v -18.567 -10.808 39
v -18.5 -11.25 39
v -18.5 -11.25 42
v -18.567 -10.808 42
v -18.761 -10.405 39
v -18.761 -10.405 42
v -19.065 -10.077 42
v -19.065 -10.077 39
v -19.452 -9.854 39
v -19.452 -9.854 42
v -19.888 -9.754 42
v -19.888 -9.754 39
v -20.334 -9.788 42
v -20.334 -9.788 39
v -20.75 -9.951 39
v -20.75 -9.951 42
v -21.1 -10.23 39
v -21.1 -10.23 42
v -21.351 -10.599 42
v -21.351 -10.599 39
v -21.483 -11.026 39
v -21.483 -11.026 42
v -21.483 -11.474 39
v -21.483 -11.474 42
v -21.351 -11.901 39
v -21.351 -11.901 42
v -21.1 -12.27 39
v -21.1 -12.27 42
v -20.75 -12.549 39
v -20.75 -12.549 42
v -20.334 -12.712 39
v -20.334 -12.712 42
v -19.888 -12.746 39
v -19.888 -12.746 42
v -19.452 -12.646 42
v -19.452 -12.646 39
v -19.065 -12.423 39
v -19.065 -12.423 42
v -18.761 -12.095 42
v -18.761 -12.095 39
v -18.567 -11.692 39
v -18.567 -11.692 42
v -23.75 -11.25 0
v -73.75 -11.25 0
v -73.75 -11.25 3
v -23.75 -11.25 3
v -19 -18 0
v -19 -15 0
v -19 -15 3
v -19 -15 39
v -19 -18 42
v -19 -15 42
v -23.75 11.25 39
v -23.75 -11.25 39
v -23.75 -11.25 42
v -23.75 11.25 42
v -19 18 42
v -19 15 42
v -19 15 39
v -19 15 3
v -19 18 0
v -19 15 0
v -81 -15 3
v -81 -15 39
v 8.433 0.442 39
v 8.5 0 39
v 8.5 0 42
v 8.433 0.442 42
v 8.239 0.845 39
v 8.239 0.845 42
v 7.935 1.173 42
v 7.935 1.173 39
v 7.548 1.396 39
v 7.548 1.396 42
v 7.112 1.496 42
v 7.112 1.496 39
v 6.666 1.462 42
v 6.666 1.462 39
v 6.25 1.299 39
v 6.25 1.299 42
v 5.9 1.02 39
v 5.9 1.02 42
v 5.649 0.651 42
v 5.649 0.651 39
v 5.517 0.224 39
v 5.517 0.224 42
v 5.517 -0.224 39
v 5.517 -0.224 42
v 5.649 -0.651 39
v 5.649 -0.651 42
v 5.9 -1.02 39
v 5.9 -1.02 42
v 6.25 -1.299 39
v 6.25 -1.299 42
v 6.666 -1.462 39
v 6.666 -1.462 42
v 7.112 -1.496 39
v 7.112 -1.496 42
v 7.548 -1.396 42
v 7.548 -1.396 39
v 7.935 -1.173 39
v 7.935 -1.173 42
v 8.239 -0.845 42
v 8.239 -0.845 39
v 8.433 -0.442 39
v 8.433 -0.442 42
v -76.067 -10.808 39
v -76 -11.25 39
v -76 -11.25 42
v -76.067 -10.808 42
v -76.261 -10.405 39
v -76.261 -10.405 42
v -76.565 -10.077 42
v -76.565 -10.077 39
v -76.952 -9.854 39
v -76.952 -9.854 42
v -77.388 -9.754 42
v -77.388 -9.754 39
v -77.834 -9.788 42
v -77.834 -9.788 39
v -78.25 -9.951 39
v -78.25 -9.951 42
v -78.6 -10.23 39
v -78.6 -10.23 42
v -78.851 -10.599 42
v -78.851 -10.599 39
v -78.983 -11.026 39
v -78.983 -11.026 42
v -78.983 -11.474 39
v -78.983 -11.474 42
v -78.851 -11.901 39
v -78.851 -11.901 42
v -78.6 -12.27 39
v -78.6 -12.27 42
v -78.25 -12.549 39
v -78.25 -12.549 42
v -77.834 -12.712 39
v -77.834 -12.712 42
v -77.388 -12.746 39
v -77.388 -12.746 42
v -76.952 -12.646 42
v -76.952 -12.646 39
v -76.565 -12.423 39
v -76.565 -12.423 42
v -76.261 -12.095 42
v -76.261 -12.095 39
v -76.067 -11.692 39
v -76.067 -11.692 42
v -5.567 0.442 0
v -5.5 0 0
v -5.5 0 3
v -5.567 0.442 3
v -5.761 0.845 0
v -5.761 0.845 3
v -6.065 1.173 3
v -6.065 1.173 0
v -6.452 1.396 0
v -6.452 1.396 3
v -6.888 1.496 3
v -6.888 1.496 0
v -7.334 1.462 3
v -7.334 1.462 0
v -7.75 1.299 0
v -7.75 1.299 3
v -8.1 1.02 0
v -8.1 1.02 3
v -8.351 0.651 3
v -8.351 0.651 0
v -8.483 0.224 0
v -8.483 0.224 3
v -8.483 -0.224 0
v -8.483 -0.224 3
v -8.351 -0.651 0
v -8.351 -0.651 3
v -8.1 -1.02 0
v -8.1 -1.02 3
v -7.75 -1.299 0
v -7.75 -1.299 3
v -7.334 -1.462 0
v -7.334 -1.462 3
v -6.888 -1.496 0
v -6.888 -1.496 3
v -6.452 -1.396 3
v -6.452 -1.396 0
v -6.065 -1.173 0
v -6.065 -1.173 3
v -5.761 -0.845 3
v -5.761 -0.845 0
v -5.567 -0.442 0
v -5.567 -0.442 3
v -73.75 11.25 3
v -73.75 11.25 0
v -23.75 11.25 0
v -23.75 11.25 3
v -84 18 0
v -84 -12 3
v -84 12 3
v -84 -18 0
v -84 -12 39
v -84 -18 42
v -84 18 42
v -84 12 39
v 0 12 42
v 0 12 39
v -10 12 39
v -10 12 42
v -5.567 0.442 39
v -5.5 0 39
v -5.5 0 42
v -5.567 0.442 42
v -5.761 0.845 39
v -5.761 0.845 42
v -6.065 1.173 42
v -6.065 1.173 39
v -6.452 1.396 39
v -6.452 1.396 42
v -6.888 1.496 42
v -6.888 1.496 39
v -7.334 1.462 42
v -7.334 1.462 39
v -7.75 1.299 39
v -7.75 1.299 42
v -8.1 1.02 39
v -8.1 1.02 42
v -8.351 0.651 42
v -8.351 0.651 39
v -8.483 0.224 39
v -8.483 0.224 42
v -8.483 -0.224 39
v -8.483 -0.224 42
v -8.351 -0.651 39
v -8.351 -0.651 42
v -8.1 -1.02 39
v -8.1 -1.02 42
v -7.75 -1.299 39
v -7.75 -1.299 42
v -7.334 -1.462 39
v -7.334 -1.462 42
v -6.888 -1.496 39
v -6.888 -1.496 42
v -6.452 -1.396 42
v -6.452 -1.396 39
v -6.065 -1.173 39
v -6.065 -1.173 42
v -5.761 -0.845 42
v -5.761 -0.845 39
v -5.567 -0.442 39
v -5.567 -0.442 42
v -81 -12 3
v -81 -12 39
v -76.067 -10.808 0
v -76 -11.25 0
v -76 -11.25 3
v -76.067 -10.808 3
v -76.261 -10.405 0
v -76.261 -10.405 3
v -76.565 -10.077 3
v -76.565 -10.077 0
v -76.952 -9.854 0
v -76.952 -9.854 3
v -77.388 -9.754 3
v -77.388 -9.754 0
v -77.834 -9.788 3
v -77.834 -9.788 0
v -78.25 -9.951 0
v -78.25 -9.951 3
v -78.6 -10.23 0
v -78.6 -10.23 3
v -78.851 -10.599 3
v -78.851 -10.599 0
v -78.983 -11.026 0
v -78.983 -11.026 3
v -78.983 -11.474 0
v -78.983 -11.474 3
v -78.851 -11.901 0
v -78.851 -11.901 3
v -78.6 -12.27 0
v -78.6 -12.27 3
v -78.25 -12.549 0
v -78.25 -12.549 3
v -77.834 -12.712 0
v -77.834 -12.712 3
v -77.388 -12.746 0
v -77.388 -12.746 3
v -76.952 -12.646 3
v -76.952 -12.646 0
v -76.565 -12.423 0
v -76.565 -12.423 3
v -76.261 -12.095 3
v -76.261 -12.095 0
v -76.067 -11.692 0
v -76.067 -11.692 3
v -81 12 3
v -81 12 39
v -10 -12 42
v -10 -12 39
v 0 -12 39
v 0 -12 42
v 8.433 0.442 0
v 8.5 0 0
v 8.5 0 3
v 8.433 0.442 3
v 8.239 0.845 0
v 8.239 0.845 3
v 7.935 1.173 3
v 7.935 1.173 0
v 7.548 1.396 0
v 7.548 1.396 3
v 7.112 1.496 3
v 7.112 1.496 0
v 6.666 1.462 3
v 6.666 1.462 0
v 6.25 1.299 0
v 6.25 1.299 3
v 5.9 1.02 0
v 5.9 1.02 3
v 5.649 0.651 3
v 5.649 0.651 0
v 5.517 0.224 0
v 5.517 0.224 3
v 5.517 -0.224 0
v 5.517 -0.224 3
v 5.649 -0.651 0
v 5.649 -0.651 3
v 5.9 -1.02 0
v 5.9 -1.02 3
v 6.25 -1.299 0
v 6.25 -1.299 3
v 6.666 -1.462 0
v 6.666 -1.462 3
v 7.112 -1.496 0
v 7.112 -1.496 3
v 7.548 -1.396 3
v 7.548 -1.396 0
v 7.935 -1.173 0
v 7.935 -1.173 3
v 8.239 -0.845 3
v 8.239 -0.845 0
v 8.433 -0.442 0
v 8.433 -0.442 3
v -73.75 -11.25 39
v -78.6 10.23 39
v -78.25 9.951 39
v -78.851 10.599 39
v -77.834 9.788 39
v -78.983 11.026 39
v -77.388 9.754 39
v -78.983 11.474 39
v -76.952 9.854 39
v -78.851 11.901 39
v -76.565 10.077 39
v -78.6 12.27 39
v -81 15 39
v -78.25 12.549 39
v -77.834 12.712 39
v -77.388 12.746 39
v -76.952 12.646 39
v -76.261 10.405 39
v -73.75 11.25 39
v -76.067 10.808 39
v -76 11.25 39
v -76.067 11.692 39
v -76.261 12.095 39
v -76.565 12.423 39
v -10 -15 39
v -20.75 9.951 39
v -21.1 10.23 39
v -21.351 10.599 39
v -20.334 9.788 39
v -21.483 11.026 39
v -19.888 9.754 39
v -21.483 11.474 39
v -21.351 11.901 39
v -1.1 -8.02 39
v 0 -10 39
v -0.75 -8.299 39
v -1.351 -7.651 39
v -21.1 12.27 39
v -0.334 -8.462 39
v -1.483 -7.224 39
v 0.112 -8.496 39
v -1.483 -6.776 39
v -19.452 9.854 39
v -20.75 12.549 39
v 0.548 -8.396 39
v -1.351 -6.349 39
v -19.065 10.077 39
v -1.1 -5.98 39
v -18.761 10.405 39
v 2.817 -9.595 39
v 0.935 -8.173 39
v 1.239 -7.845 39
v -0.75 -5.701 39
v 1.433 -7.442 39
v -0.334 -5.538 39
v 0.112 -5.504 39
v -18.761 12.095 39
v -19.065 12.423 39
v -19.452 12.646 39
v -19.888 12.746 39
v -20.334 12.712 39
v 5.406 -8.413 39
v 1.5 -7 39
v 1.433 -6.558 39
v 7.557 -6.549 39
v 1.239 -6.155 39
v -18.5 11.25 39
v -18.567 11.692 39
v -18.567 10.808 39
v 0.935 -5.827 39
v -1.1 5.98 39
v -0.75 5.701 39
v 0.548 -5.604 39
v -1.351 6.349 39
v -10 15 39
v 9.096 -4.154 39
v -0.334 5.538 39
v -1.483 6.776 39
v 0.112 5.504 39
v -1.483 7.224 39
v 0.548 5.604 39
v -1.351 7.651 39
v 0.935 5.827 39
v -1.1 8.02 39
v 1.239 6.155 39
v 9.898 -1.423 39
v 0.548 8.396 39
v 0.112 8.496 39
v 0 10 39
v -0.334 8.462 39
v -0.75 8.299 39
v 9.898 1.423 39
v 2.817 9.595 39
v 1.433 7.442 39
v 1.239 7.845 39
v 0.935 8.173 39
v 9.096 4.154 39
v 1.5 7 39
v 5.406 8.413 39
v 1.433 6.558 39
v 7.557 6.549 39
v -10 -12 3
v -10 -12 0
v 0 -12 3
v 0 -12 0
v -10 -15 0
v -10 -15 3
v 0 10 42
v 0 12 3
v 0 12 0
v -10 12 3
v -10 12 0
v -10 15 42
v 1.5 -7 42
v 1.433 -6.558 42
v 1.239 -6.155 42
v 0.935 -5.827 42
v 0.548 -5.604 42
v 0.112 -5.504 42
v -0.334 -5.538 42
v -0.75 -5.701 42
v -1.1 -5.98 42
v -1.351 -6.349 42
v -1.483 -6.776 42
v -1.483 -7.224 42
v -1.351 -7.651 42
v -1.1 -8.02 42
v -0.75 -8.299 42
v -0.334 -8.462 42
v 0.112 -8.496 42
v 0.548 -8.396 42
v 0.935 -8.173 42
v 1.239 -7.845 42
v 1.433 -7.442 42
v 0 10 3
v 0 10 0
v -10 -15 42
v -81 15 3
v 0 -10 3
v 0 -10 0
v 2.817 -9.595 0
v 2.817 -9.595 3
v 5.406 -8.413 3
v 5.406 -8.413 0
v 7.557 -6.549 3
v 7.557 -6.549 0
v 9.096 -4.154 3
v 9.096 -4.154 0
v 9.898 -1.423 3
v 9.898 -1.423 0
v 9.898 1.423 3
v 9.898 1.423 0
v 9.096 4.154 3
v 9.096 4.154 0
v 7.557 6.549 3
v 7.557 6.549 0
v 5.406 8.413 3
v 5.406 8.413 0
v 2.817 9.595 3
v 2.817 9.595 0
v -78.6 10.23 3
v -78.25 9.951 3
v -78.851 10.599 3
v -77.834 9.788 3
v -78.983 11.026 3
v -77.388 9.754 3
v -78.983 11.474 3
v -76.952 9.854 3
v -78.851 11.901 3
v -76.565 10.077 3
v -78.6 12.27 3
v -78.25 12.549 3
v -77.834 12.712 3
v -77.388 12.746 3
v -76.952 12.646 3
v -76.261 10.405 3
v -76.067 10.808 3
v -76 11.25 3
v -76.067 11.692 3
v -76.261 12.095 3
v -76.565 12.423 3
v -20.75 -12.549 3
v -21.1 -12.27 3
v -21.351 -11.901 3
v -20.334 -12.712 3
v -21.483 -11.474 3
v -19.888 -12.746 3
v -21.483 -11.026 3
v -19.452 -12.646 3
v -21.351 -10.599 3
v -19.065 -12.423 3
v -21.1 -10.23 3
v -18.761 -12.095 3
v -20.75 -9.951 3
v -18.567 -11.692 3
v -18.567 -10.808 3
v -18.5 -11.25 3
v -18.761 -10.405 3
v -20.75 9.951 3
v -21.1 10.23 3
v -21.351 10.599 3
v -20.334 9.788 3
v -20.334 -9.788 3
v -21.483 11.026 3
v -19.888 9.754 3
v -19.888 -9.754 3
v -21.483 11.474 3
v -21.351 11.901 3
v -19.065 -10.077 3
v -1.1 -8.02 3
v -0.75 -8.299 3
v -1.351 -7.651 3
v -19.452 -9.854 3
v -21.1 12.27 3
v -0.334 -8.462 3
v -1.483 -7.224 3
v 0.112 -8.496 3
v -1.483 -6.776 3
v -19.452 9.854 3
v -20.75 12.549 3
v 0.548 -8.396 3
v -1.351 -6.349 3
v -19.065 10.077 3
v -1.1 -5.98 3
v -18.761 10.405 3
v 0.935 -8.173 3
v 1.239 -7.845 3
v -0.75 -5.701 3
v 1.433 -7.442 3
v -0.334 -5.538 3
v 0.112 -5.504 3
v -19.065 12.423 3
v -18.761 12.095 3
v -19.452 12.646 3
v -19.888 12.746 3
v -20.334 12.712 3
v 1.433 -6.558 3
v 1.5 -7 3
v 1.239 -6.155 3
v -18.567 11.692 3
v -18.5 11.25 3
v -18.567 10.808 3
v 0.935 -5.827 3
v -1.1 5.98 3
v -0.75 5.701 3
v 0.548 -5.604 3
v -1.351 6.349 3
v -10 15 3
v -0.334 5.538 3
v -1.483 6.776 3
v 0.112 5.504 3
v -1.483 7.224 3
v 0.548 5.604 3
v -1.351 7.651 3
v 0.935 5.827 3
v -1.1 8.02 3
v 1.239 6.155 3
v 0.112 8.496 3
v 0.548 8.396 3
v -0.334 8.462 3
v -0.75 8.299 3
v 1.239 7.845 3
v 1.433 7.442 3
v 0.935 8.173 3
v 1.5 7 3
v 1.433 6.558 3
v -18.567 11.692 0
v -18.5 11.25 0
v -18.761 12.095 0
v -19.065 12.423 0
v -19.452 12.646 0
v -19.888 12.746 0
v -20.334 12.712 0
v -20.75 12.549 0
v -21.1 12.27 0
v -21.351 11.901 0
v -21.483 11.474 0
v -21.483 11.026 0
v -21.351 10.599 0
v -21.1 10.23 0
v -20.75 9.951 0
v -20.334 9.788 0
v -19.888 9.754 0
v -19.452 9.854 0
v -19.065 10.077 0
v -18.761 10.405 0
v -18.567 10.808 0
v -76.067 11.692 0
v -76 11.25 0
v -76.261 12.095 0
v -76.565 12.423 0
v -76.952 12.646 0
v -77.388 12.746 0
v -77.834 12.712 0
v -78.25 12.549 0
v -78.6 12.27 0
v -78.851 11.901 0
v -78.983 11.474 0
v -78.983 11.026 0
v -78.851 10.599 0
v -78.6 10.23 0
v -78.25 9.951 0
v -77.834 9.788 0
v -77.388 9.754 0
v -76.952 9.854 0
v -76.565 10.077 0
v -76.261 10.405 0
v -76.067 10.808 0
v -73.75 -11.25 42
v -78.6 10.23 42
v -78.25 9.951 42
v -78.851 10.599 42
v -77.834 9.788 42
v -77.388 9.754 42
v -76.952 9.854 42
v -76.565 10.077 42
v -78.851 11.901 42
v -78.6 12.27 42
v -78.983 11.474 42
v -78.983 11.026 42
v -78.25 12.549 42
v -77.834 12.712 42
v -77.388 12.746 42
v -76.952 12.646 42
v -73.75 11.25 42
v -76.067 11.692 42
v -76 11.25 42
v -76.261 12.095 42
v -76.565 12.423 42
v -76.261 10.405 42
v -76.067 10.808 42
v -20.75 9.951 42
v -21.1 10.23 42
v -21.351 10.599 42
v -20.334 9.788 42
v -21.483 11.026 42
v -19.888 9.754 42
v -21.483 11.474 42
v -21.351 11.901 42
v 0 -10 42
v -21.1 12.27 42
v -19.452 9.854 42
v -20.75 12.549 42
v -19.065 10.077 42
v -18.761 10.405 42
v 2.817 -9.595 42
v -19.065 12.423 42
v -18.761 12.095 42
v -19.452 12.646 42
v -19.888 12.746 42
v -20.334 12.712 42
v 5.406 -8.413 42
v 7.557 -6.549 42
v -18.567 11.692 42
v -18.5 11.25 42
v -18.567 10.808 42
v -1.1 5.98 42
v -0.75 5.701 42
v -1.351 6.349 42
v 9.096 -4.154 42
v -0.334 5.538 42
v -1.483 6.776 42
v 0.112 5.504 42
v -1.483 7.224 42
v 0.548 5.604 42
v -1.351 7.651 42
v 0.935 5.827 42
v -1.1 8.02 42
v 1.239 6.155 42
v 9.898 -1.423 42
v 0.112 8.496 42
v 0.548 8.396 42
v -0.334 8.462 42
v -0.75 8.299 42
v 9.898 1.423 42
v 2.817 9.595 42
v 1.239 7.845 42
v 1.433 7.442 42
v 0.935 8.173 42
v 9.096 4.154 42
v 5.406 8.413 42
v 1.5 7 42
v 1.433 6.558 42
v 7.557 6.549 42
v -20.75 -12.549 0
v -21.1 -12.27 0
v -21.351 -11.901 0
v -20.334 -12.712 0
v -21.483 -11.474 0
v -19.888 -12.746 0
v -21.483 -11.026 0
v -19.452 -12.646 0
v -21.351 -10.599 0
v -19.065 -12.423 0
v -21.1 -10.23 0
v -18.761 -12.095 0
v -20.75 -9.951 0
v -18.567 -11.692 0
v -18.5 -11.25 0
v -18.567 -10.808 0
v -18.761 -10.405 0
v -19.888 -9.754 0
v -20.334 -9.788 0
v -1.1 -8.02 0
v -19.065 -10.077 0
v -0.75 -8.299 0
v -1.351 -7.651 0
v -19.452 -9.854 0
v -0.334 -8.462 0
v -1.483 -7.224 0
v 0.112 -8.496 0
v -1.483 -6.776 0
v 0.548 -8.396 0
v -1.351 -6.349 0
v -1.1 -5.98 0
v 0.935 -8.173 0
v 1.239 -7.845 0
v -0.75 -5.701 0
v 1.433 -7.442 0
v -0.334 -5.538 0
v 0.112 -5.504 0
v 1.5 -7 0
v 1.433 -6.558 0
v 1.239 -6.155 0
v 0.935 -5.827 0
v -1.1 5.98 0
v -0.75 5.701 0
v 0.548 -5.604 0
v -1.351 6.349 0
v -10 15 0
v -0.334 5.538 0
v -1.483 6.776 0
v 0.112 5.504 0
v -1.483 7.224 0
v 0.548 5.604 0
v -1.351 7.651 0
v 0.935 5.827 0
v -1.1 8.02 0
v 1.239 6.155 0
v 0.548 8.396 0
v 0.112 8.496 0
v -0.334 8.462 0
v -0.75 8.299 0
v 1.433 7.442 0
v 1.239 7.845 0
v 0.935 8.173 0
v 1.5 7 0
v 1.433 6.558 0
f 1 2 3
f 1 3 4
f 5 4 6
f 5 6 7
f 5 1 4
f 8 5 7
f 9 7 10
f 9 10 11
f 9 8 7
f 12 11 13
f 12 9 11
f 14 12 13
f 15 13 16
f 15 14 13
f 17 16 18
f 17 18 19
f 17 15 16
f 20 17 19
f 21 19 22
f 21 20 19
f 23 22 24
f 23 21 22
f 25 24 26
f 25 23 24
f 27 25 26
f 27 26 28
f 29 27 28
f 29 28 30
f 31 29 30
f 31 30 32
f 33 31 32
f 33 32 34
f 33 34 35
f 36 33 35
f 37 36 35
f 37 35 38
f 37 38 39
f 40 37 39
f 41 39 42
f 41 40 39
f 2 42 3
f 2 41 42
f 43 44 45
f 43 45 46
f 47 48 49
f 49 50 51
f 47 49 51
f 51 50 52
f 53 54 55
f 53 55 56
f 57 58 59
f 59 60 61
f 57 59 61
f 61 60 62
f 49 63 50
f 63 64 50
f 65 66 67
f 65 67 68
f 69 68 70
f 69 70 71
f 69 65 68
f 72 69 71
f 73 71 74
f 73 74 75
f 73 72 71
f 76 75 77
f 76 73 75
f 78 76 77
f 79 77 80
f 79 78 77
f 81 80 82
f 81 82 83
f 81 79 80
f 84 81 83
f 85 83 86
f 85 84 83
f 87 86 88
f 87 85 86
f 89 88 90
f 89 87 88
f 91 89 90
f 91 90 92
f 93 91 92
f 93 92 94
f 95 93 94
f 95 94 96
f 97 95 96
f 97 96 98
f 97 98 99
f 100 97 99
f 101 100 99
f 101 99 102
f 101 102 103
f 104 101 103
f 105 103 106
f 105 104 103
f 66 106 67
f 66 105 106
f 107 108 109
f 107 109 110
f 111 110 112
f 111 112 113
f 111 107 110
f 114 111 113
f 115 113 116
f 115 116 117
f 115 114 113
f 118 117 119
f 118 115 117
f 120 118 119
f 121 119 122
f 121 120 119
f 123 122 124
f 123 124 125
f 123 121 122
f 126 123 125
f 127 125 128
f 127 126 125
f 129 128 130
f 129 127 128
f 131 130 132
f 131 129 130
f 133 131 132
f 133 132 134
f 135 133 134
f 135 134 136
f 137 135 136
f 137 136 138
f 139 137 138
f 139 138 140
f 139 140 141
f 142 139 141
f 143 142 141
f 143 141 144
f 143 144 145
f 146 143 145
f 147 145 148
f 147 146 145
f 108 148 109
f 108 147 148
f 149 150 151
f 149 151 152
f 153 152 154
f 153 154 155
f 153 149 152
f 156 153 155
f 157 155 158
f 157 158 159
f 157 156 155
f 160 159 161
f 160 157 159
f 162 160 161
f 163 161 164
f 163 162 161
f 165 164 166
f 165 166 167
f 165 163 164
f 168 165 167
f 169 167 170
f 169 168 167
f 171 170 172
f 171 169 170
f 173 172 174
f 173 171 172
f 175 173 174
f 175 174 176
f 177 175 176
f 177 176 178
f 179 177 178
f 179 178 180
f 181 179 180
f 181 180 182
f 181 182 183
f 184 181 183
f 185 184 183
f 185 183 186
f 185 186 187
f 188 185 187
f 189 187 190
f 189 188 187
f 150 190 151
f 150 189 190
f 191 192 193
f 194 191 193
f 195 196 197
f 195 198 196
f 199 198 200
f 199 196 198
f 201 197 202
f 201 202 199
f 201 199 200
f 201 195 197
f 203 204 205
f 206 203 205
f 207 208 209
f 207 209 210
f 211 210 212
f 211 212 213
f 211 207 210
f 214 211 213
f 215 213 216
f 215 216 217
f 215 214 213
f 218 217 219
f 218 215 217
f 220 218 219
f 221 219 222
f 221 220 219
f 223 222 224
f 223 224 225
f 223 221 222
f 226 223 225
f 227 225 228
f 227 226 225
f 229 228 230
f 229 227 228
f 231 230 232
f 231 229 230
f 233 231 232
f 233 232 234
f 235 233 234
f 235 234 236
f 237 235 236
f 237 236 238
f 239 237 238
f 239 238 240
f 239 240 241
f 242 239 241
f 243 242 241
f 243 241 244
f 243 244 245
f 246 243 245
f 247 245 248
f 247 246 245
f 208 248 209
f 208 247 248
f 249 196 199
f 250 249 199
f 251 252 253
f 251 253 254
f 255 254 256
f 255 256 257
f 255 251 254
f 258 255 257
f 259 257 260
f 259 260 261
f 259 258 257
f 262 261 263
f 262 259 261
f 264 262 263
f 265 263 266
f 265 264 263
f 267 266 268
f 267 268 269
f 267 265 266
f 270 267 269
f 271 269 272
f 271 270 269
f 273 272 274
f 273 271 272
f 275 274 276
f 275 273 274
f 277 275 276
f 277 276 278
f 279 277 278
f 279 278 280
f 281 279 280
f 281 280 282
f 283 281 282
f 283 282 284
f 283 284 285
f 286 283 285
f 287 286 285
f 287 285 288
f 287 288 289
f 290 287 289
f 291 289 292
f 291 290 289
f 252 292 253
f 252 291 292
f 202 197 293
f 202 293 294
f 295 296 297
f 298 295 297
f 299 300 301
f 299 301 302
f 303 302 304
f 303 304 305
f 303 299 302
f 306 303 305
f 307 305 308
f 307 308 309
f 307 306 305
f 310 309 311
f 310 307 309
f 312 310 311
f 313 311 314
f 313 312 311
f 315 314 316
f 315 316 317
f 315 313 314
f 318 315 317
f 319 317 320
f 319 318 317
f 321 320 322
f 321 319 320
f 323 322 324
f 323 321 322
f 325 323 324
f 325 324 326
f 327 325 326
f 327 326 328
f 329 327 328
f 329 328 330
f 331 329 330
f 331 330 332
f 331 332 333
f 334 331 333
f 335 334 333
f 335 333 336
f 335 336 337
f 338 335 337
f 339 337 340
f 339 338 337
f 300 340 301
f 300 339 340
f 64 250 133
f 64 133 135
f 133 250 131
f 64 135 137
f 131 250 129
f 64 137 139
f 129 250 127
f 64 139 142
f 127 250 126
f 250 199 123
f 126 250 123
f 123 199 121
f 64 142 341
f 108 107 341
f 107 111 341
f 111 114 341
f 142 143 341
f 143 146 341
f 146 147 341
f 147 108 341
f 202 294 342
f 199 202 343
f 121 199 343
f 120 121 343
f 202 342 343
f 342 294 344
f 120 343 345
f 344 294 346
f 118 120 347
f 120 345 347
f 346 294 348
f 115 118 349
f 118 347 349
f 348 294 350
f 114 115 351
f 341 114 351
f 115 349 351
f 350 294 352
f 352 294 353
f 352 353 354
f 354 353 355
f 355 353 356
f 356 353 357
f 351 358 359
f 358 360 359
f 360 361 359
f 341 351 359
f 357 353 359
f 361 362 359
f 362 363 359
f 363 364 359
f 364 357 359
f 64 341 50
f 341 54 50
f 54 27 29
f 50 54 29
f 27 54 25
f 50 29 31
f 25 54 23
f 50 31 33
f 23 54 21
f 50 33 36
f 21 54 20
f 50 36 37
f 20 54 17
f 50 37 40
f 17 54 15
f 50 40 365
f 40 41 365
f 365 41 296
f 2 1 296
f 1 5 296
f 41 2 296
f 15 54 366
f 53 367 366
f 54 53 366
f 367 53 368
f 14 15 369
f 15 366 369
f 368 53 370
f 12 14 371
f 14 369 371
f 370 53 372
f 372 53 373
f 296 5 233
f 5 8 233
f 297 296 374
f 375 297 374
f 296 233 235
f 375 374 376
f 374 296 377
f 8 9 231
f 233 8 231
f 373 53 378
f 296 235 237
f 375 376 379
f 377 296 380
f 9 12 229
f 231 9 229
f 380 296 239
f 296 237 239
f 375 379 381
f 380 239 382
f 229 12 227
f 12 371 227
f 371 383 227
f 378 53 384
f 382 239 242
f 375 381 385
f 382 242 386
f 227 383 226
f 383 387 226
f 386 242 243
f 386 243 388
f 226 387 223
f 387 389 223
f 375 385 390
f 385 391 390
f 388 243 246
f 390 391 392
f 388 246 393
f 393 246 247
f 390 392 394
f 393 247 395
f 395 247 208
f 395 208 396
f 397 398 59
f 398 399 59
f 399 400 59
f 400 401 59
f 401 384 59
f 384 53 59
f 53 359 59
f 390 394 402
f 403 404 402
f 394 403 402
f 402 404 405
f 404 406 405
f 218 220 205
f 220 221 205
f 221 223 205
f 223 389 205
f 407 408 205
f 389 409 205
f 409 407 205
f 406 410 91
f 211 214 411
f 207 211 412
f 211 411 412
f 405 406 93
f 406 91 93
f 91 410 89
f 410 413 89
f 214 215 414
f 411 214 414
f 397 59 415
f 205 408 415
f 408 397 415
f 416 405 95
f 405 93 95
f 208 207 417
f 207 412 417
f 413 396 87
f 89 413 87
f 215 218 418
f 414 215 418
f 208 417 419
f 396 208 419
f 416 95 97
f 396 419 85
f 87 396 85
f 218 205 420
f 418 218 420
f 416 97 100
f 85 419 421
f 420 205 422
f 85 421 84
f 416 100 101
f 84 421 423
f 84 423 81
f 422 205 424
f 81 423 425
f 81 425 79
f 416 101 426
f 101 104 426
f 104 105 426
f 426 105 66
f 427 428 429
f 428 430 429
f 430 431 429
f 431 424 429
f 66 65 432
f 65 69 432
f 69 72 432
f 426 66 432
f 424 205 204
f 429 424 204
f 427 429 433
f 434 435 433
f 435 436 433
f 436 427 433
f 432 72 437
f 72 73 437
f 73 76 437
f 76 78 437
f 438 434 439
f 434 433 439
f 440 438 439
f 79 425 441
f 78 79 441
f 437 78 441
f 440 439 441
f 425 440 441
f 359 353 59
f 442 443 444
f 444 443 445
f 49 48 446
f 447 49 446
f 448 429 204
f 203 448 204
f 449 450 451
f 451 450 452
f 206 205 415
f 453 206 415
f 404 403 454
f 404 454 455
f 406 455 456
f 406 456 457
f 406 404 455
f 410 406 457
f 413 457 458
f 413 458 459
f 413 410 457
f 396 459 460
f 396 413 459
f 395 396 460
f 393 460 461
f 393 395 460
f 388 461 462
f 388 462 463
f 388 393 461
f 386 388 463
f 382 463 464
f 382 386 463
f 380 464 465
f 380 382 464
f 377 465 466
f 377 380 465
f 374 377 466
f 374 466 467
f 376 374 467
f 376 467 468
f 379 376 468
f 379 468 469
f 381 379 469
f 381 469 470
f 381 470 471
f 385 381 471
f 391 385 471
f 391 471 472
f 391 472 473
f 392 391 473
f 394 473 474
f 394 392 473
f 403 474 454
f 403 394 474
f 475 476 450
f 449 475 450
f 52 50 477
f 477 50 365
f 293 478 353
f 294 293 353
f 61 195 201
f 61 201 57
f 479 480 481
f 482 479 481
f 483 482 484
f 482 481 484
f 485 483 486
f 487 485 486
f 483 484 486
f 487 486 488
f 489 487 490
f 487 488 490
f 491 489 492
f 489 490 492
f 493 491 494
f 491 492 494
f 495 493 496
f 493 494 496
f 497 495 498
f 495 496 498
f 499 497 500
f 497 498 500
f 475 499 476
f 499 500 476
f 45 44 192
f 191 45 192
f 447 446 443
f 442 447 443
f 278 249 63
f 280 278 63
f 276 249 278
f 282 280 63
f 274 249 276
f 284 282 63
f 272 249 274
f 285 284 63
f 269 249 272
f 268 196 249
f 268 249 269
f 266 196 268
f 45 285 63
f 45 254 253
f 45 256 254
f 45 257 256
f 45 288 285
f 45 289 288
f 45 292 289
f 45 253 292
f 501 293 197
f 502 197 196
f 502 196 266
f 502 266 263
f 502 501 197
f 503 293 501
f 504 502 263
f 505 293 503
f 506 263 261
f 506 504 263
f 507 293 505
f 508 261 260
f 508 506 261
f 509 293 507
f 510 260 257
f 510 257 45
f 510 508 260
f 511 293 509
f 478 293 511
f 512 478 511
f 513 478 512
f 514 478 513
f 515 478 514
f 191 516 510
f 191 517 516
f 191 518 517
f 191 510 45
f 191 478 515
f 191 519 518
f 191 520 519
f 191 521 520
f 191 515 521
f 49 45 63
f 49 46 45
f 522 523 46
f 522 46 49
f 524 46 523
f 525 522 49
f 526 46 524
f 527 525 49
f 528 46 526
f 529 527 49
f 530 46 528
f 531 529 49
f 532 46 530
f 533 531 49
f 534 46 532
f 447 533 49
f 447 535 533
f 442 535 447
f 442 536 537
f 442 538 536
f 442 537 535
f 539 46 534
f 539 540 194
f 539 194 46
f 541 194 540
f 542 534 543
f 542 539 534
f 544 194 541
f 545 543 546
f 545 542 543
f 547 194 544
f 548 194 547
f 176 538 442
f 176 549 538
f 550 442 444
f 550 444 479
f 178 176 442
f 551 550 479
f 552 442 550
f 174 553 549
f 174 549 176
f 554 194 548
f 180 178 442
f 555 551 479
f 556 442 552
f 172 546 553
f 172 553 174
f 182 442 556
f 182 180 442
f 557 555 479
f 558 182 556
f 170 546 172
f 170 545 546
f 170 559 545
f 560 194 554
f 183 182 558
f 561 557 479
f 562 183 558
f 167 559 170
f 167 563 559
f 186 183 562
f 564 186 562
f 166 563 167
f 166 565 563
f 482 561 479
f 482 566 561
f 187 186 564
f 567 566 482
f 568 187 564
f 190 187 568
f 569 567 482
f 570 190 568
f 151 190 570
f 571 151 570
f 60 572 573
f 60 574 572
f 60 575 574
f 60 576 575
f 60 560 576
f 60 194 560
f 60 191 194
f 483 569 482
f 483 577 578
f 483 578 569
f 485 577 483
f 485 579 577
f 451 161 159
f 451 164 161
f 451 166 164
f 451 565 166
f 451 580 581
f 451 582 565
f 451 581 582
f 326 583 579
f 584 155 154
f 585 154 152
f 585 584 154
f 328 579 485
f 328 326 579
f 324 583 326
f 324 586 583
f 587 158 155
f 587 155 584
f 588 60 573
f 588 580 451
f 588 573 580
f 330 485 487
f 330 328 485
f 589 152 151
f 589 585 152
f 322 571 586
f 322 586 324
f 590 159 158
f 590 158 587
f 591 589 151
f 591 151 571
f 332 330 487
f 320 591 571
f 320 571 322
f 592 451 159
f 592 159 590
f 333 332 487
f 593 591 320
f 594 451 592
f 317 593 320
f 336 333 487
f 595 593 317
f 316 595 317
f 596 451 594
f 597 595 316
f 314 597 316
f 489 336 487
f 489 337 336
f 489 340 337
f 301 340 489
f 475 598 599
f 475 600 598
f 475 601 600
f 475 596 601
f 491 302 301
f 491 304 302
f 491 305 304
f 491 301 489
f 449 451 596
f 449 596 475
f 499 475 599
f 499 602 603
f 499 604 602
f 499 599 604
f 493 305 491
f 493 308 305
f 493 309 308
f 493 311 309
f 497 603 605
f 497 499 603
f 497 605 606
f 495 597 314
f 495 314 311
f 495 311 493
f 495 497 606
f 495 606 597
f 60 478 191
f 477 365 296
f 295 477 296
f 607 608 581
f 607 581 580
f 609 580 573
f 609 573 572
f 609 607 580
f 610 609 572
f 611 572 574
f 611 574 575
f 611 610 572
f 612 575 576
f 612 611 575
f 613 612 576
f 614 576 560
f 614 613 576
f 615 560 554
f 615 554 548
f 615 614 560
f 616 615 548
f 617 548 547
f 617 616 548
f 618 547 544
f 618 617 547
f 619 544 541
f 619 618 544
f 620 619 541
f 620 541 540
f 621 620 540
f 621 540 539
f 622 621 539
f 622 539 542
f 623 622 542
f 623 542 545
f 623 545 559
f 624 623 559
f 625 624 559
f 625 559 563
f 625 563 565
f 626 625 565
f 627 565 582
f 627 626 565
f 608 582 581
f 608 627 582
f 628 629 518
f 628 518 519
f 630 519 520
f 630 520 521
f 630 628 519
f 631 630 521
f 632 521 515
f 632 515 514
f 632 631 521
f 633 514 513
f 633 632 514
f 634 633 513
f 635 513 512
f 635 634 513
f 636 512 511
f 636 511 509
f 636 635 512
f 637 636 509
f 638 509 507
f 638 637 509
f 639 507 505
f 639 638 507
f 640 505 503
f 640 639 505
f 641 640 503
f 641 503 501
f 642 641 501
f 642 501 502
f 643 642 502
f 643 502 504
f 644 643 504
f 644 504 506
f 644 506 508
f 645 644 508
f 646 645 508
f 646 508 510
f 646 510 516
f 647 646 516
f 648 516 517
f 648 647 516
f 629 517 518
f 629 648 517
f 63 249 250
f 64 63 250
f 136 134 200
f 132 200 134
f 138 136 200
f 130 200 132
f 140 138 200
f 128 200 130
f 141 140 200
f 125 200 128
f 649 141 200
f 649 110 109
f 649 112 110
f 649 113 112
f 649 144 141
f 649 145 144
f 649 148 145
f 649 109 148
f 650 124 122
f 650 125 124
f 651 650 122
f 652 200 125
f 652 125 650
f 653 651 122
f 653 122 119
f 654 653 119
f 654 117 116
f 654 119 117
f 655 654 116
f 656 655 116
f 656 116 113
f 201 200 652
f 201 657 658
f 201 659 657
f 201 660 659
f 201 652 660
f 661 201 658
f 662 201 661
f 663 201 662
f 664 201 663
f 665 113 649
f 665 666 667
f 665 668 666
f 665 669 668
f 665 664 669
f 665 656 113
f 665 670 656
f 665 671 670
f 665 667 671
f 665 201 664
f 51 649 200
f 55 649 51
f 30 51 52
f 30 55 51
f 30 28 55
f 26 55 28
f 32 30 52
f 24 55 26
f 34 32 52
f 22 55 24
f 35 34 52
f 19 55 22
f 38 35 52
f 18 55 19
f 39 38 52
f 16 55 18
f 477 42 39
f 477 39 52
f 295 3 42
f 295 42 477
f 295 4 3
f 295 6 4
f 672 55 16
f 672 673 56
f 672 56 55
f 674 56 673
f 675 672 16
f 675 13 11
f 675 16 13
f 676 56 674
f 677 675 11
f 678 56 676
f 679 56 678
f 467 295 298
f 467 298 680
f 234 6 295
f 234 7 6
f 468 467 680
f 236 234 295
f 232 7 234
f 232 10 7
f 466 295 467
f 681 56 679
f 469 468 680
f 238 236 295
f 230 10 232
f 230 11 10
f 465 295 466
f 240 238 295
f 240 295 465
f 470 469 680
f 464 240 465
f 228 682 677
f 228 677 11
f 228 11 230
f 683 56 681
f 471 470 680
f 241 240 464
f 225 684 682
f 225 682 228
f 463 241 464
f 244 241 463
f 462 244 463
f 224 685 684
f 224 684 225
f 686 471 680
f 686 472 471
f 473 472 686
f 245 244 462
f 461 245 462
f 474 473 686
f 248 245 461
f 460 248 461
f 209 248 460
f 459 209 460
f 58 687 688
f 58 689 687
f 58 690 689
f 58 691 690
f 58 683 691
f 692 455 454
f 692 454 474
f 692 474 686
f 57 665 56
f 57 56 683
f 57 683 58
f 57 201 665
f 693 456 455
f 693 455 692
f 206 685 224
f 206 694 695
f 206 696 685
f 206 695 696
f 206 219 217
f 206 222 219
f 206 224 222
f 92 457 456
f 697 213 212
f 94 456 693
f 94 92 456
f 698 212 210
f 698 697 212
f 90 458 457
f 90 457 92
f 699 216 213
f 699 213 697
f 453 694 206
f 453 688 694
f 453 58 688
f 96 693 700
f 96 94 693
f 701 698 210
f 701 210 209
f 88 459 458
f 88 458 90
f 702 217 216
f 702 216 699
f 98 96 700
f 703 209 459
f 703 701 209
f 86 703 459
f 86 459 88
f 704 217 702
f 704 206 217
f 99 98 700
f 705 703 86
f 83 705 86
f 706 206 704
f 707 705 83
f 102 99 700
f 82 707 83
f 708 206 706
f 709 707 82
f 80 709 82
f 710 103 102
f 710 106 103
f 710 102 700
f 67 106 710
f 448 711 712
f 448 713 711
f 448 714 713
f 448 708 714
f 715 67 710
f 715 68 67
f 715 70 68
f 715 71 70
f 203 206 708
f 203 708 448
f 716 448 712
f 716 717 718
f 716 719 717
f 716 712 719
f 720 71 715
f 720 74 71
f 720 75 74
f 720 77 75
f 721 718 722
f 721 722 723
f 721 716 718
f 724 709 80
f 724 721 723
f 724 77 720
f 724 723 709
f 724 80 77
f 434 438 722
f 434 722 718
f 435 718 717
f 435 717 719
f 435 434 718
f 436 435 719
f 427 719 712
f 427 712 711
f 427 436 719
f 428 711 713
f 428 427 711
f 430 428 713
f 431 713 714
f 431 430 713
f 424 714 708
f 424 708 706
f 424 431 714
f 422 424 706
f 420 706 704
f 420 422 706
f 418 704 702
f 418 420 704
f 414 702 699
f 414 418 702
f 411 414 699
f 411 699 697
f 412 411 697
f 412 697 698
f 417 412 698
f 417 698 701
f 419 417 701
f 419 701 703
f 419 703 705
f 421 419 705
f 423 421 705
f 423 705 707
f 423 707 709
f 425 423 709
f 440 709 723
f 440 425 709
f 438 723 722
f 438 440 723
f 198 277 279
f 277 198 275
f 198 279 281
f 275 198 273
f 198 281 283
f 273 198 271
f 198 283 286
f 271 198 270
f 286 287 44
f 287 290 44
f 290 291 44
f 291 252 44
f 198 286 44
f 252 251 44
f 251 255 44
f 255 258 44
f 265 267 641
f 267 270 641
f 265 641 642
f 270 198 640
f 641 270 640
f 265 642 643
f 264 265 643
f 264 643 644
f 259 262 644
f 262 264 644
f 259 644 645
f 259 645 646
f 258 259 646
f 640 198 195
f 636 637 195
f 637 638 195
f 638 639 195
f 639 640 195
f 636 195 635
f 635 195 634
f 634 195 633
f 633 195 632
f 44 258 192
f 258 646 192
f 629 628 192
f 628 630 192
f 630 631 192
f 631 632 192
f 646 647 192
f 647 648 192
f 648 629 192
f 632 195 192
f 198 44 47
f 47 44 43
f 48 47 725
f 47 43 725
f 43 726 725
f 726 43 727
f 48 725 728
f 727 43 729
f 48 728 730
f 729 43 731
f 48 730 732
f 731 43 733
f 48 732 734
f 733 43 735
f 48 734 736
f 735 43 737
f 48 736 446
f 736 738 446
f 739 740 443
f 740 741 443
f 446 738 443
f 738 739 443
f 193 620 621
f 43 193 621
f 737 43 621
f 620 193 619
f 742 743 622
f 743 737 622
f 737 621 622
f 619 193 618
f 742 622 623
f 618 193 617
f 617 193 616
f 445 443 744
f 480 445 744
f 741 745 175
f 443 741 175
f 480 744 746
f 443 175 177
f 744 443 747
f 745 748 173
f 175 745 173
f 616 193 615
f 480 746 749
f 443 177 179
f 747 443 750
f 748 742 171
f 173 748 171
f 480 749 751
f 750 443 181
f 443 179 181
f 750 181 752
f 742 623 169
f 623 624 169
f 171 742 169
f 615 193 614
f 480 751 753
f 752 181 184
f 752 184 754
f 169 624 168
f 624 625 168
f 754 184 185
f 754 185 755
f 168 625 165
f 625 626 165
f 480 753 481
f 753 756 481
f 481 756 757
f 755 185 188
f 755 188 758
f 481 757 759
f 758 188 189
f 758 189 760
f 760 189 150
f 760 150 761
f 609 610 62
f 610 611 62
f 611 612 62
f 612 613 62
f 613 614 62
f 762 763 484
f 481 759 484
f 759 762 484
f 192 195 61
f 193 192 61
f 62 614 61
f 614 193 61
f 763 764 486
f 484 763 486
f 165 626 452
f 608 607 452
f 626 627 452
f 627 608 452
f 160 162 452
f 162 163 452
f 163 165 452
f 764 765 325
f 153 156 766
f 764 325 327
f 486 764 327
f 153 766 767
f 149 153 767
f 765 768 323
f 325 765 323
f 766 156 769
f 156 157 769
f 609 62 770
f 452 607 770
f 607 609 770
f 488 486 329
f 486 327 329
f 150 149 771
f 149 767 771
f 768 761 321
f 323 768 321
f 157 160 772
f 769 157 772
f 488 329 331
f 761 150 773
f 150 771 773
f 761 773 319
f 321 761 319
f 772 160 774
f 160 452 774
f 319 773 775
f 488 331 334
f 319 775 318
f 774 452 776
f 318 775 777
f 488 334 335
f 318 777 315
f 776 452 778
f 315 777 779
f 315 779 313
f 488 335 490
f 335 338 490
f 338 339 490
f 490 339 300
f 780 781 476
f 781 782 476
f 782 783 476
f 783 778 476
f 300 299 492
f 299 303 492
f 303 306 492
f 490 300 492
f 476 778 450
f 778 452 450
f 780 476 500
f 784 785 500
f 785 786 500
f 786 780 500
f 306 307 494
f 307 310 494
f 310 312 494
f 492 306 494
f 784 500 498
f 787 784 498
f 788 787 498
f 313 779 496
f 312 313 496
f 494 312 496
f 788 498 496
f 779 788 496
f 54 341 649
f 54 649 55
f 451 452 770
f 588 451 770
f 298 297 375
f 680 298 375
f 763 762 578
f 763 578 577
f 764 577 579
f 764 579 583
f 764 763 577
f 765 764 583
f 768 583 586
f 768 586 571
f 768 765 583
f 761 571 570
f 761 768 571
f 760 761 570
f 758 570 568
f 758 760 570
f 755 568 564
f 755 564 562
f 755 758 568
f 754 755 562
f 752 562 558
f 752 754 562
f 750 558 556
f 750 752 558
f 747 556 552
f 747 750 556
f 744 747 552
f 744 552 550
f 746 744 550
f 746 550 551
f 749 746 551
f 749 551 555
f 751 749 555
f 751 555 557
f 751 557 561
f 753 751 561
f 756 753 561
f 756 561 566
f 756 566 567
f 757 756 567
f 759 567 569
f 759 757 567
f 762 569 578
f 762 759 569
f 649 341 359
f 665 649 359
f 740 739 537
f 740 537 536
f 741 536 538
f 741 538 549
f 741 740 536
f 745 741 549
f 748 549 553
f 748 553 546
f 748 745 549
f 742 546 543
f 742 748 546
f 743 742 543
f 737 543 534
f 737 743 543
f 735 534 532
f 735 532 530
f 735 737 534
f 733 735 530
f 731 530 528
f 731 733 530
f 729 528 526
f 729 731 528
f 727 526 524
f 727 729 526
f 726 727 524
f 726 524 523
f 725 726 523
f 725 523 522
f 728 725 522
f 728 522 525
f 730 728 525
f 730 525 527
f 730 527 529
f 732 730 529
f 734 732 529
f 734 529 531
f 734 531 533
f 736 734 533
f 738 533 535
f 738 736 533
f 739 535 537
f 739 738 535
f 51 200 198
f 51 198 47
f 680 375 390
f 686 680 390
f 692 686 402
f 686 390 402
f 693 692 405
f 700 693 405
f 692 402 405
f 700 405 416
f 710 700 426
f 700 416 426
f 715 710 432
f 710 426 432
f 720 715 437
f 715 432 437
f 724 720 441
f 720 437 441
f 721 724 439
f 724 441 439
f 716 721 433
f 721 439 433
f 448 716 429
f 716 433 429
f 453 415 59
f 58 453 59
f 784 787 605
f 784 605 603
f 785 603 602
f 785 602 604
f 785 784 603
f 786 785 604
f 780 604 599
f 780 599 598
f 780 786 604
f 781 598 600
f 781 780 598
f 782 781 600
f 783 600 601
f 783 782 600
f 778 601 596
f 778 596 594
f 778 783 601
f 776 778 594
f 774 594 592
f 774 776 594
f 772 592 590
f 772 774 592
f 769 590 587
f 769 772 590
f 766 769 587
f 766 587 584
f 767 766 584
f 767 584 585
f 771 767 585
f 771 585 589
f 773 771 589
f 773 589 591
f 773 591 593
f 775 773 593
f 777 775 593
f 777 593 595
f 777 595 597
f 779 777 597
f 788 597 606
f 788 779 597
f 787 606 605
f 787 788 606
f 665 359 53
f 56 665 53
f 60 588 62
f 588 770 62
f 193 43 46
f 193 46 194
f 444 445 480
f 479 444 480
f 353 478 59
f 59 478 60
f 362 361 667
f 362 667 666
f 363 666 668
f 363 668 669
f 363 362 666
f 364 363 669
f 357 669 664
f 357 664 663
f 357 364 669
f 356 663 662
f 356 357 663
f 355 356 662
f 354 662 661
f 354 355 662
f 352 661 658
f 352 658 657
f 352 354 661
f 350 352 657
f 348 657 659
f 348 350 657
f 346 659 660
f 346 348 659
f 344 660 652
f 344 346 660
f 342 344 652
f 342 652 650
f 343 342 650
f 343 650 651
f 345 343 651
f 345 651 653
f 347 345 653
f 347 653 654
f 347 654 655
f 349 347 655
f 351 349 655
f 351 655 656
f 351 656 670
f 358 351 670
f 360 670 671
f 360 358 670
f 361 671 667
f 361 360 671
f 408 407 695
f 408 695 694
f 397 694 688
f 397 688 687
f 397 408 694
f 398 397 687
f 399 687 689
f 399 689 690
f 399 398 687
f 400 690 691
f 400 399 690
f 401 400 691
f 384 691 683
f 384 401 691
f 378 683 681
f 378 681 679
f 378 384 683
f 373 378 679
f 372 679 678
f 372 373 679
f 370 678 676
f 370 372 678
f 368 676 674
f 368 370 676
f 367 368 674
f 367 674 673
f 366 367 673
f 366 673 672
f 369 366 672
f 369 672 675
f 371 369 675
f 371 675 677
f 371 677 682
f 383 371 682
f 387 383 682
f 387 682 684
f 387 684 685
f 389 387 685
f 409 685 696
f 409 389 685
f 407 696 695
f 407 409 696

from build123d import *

# Parameters (mm, degrees)
SKETCH1_R           = 1.5
SKETCH1_W           = 50
SKETCH1_H           = 22.5
BOSS_EXTRUDE2_DEPTH = 3
SKETCH2_W           = 42
SKETCH2_H           = 30
BOSS_EXTRUDE3_DEPTH = 3
BOSS_EXTRUDE4_START = 39
SKETCH1_2_R         = 1.5
SKETCH1_2_W         = 50
SKETCH1_2_H         = 22.5
BOSS_EXTRUDE4_DEPTH = 3
SKETCH4_W           = 36
SKETCH4_H           = 24
CUT_EXTRUDE1_DEPTH  = 3
SKETCH5_W           = 65
SKETCH5_H           = 42
BOSS_EXTRUDE5_DEPTH = 3
SKETCH6_W           = 65
SKETCH6_H           = 42
BOSS_EXTRUDE6_DEPTH = 3


with BuildPart() as part:
    # Sketch1 → Boss-Extrude2 (new body)
    with BuildSketch(Plane.XY):
        with BuildLine():
            Line((0, 10), (0, 12))
            Line((0, 12), (-10, 12))
            Line((-10, 12), (-10, 15))
            Line((-10, 15), (-81, 15))
            Line((-81, 15), (-81, -15))
            Line((-81, -15), (-10, -15))
            Line((-10, -15), (-10, -12))
            Line((-10, -12), (0, -12))
            Line((0, -12), (0, -10))
            ThreePointArc((0, -10), (10, 0), (0, 10))
        make_face()
        with Locations((0, 7)):
            Circle(SKETCH1_R, mode=Mode.SUBTRACT)
        with Locations((7, 0)):
            Circle(SKETCH1_R, mode=Mode.SUBTRACT)
        with Locations((0, -7)):
            Circle(SKETCH1_R, mode=Mode.SUBTRACT)
        with Locations((-7, 0)):
            Circle(SKETCH1_R, mode=Mode.SUBTRACT)
        with Locations((-20, 11.25)):
            Circle(SKETCH1_R, mode=Mode.SUBTRACT)
        with Locations((-20, -11.25)):
            Circle(SKETCH1_R, mode=Mode.SUBTRACT)
        with Locations((-77.5, 11.25)):
            Circle(SKETCH1_R, mode=Mode.SUBTRACT)
        with Locations((-77.5, -11.25)):
            Circle(SKETCH1_R, mode=Mode.SUBTRACT)
        with Locations((-48.75, 0)):
            Rectangle(SKETCH1_W, SKETCH1_H, mode=Mode.SUBTRACT)
    extrude(amount=BOSS_EXTRUDE2_DEPTH)

    # Sketch2 → Boss-Extrude3 (add)
    with BuildSketch(Plane.ZY.offset(81)):
        with Locations((21, 0)):
            Rectangle(SKETCH2_W, SKETCH2_H)
    extrude(amount=BOSS_EXTRUDE3_DEPTH)

    # Sketch1<2> → Boss-Extrude4 (add)
    with BuildSketch(Plane.XY.offset(BOSS_EXTRUDE4_START)):
        with BuildLine():
            Line((0, 10), (0, 12))
            Line((0, 12), (-10, 12))
            Line((-10, 12), (-10, 15))
            Line((-10, 15), (-81, 15))
            Line((-81, 15), (-81, -15))
            Line((-81, -15), (-10, -15))
            Line((-10, -15), (-10, -12))
            Line((-10, -12), (0, -12))
            Line((0, -12), (0, -10))
            ThreePointArc((0, -10), (10, 0), (0, 10))
        make_face()
        with Locations((0, 7)):
            Circle(SKETCH1_2_R, mode=Mode.SUBTRACT)
        with Locations((7, 0)):
            Circle(SKETCH1_2_R, mode=Mode.SUBTRACT)
        with Locations((0, -7)):
            Circle(SKETCH1_2_R, mode=Mode.SUBTRACT)
        with Locations((-7, 0)):
            Circle(SKETCH1_2_R, mode=Mode.SUBTRACT)
        with Locations((-20, 11.25)):
            Circle(SKETCH1_2_R, mode=Mode.SUBTRACT)
        with Locations((-20, -11.25)):
            Circle(SKETCH1_2_R, mode=Mode.SUBTRACT)
        with Locations((-77.5, 11.25)):
            Circle(SKETCH1_2_R, mode=Mode.SUBTRACT)
        with Locations((-77.5, -11.25)):
            Circle(SKETCH1_2_R, mode=Mode.SUBTRACT)
        with Locations((-48.75, 0)):
            Rectangle(SKETCH1_2_W, SKETCH1_2_H, mode=Mode.SUBTRACT)
    extrude(amount=BOSS_EXTRUDE4_DEPTH)

    # Sketch4 → Cut-Extrude1 (cut)
    with BuildSketch(Plane.ZY.offset(84)):
        with Locations((21, 0)):
            Rectangle(SKETCH4_W, SKETCH4_H)
    extrude(amount=-CUT_EXTRUDE1_DEPTH, mode=Mode.SUBTRACT)

    # Sketch5 → Boss-Extrude5 (add)
    with BuildSketch(Plane(origin=(0, 15, 0), x_dir=(1, 0, 0), z_dir=(0, 1, 0))):
        with Locations((-51.5, -21)):
            Rectangle(SKETCH5_W, SKETCH5_H)
    extrude(amount=BOSS_EXTRUDE5_DEPTH)

    # Sketch6 → Boss-Extrude6 (add)
    with BuildSketch(Plane.XZ.offset(15)):
        with Locations((-51.5, 21)):
            Rectangle(SKETCH6_W, SKETCH6_H)
    extrude(amount=BOSS_EXTRUDE6_DEPTH)


solid = part.part
